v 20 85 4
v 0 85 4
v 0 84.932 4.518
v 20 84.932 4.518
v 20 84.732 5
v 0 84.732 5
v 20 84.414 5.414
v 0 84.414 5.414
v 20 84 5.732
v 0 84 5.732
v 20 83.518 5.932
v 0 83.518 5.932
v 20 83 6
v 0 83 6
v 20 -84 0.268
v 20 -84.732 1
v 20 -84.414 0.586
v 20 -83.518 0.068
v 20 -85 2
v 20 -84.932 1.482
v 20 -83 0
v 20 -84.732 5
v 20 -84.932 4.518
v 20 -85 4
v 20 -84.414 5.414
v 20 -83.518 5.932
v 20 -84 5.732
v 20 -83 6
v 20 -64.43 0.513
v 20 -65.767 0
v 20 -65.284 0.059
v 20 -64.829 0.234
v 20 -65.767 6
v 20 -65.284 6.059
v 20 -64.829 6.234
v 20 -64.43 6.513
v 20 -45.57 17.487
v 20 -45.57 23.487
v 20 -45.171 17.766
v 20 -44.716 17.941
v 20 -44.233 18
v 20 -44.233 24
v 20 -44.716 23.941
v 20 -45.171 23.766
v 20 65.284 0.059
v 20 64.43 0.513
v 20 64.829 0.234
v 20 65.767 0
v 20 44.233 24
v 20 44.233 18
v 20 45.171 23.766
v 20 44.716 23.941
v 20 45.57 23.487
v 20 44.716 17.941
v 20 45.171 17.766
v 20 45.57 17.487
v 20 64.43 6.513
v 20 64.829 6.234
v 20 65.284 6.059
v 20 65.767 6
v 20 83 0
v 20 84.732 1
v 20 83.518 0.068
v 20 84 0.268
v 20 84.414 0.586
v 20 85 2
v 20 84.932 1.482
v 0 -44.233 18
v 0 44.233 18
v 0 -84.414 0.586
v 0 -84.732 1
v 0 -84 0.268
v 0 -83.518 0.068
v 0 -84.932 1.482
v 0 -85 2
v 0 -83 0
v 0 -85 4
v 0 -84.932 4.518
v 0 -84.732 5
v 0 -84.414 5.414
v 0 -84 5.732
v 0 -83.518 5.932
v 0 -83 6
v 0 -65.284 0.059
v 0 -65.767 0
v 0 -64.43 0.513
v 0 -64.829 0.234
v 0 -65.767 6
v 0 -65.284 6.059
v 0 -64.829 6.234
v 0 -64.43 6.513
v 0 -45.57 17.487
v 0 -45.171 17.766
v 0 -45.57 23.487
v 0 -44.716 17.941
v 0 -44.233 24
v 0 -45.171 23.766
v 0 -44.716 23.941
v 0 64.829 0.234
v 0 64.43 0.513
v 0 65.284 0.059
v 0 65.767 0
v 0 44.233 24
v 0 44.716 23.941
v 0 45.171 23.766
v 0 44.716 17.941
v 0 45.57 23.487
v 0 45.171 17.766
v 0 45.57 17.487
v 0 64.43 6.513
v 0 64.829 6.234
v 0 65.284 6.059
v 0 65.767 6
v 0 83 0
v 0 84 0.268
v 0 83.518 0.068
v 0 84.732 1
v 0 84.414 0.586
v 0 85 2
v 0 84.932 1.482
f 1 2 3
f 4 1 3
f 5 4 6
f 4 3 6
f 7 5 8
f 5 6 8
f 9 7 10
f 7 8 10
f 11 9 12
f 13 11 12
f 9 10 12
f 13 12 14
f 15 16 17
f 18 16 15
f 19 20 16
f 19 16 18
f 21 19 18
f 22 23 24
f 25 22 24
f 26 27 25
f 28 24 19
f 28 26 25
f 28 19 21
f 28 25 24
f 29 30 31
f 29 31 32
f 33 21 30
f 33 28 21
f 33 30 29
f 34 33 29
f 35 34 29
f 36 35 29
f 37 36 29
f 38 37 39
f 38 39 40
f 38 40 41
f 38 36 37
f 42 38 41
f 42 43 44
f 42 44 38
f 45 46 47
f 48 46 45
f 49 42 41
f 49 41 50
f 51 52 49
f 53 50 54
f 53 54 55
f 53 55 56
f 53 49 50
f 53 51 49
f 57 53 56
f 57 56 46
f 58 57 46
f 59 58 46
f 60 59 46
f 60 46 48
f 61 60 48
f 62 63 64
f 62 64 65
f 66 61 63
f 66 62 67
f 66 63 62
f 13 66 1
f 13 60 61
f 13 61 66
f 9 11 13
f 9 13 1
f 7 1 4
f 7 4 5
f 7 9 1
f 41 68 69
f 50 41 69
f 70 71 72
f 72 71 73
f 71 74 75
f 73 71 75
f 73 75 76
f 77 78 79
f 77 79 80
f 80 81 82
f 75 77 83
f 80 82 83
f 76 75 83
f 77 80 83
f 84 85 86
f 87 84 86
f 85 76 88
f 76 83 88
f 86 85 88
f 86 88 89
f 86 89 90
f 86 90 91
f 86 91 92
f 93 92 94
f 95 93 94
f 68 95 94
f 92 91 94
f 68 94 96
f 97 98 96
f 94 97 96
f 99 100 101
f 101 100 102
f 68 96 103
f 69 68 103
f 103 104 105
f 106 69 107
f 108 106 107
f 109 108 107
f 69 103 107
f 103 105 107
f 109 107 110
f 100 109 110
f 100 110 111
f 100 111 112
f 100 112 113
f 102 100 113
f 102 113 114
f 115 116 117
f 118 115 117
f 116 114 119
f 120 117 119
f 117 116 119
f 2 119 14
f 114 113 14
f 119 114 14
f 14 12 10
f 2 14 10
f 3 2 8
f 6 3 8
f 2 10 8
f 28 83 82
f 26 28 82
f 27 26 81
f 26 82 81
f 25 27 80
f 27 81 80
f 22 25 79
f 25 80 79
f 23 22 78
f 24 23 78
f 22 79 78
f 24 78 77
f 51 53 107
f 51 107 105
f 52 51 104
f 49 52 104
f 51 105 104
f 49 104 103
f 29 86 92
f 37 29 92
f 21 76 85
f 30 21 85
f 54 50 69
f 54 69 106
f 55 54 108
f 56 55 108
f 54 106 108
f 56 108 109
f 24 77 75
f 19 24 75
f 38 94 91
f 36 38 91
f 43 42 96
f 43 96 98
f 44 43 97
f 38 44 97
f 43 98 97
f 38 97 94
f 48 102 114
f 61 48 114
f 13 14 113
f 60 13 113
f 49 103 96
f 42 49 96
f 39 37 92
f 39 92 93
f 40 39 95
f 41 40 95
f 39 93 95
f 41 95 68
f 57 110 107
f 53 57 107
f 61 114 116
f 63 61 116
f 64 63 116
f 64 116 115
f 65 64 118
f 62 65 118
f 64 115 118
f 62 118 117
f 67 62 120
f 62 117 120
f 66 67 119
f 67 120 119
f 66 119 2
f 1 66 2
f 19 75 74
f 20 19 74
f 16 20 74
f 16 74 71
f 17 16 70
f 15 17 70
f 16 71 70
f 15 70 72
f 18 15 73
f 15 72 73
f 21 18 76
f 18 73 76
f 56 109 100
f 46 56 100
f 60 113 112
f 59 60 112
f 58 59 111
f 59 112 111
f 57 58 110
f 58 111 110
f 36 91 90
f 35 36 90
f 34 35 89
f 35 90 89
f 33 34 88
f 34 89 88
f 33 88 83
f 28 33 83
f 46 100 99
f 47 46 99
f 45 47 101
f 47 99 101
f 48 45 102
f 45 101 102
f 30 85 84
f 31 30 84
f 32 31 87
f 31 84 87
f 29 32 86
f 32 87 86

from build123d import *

# Parameters (mm, degrees)
F1_DEPTH = 20


with BuildPart() as f1:
    # F0 (on Right) → F1 (new body)
    with BuildSketch(Plane.YZ):
        with BuildLine():
            Line((-65.767472, 6), (-83, 6))
            ThreePointArc((-83, 6), (-84.414214, 5.414214), (-85, 4))
            Line((-85, 4), (-85, 2))
            ThreePointArc((-85, 2), (-84.414214, 0.585786), (-83, 0))
            Line((-83, 0), (-65.767472, 0))
            ThreePointArc((-65.767472, 0), (-65.050944, 0.132759), (-64.429543, 0.513412))
            Line((-64.429543, 0.513412), (-45.570457, 17.486588))
            ThreePointArc((-45.570457, 17.486588), (-44.949056, 17.867241), (-44.232528, 18))
            Line((-44.232528, 18), (0, 18))
            Line((0, 18), (0, 24))
            Line((0, 24), (-44.232528, 24))
            ThreePointArc((-44.232528, 24), (-44.949056, 23.867241), (-45.570457, 23.486588))
            Line((-45.570457, 23.486588), (-64.429543, 6.513412))
            ThreePointArc((-64.429543, 6.513412), (-65.050944, 6.132759), (-65.767472, 6))
        make_face()
        with BuildLine():
            Line((44.232528, 24), (0, 24))
            Line((0, 24), (0, 18))
            Line((0, 18), (44.232528, 18))
            ThreePointArc((44.232528, 18), (44.949056, 17.867241), (45.570457, 17.486588))
            Line((45.570457, 17.486588), (64.429543, 0.513412))
            ThreePointArc((64.429543, 0.513412), (65.050944, 0.132759), (65.767472, 0))
            Line((65.767472, 0), (83, 0))
            ThreePointArc((83, 0), (84.414214, 0.585786), (85, 2))
            Line((85, 2), (85, 4))
            ThreePointArc((85, 4), (84.414214, 5.414214), (83, 6))
            Line((83, 6), (65.767472, 6))
            ThreePointArc((65.767472, 6), (65.050944, 6.132759), (64.429543, 6.513412))
            Line((64.429543, 6.513412), (45.570457, 23.486588))
            ThreePointArc((45.570457, 23.486588), (44.949056, 23.867241), (44.232528, 24))
        make_face()
    extrude(amount=F1_DEPTH)


solid = f1.part
